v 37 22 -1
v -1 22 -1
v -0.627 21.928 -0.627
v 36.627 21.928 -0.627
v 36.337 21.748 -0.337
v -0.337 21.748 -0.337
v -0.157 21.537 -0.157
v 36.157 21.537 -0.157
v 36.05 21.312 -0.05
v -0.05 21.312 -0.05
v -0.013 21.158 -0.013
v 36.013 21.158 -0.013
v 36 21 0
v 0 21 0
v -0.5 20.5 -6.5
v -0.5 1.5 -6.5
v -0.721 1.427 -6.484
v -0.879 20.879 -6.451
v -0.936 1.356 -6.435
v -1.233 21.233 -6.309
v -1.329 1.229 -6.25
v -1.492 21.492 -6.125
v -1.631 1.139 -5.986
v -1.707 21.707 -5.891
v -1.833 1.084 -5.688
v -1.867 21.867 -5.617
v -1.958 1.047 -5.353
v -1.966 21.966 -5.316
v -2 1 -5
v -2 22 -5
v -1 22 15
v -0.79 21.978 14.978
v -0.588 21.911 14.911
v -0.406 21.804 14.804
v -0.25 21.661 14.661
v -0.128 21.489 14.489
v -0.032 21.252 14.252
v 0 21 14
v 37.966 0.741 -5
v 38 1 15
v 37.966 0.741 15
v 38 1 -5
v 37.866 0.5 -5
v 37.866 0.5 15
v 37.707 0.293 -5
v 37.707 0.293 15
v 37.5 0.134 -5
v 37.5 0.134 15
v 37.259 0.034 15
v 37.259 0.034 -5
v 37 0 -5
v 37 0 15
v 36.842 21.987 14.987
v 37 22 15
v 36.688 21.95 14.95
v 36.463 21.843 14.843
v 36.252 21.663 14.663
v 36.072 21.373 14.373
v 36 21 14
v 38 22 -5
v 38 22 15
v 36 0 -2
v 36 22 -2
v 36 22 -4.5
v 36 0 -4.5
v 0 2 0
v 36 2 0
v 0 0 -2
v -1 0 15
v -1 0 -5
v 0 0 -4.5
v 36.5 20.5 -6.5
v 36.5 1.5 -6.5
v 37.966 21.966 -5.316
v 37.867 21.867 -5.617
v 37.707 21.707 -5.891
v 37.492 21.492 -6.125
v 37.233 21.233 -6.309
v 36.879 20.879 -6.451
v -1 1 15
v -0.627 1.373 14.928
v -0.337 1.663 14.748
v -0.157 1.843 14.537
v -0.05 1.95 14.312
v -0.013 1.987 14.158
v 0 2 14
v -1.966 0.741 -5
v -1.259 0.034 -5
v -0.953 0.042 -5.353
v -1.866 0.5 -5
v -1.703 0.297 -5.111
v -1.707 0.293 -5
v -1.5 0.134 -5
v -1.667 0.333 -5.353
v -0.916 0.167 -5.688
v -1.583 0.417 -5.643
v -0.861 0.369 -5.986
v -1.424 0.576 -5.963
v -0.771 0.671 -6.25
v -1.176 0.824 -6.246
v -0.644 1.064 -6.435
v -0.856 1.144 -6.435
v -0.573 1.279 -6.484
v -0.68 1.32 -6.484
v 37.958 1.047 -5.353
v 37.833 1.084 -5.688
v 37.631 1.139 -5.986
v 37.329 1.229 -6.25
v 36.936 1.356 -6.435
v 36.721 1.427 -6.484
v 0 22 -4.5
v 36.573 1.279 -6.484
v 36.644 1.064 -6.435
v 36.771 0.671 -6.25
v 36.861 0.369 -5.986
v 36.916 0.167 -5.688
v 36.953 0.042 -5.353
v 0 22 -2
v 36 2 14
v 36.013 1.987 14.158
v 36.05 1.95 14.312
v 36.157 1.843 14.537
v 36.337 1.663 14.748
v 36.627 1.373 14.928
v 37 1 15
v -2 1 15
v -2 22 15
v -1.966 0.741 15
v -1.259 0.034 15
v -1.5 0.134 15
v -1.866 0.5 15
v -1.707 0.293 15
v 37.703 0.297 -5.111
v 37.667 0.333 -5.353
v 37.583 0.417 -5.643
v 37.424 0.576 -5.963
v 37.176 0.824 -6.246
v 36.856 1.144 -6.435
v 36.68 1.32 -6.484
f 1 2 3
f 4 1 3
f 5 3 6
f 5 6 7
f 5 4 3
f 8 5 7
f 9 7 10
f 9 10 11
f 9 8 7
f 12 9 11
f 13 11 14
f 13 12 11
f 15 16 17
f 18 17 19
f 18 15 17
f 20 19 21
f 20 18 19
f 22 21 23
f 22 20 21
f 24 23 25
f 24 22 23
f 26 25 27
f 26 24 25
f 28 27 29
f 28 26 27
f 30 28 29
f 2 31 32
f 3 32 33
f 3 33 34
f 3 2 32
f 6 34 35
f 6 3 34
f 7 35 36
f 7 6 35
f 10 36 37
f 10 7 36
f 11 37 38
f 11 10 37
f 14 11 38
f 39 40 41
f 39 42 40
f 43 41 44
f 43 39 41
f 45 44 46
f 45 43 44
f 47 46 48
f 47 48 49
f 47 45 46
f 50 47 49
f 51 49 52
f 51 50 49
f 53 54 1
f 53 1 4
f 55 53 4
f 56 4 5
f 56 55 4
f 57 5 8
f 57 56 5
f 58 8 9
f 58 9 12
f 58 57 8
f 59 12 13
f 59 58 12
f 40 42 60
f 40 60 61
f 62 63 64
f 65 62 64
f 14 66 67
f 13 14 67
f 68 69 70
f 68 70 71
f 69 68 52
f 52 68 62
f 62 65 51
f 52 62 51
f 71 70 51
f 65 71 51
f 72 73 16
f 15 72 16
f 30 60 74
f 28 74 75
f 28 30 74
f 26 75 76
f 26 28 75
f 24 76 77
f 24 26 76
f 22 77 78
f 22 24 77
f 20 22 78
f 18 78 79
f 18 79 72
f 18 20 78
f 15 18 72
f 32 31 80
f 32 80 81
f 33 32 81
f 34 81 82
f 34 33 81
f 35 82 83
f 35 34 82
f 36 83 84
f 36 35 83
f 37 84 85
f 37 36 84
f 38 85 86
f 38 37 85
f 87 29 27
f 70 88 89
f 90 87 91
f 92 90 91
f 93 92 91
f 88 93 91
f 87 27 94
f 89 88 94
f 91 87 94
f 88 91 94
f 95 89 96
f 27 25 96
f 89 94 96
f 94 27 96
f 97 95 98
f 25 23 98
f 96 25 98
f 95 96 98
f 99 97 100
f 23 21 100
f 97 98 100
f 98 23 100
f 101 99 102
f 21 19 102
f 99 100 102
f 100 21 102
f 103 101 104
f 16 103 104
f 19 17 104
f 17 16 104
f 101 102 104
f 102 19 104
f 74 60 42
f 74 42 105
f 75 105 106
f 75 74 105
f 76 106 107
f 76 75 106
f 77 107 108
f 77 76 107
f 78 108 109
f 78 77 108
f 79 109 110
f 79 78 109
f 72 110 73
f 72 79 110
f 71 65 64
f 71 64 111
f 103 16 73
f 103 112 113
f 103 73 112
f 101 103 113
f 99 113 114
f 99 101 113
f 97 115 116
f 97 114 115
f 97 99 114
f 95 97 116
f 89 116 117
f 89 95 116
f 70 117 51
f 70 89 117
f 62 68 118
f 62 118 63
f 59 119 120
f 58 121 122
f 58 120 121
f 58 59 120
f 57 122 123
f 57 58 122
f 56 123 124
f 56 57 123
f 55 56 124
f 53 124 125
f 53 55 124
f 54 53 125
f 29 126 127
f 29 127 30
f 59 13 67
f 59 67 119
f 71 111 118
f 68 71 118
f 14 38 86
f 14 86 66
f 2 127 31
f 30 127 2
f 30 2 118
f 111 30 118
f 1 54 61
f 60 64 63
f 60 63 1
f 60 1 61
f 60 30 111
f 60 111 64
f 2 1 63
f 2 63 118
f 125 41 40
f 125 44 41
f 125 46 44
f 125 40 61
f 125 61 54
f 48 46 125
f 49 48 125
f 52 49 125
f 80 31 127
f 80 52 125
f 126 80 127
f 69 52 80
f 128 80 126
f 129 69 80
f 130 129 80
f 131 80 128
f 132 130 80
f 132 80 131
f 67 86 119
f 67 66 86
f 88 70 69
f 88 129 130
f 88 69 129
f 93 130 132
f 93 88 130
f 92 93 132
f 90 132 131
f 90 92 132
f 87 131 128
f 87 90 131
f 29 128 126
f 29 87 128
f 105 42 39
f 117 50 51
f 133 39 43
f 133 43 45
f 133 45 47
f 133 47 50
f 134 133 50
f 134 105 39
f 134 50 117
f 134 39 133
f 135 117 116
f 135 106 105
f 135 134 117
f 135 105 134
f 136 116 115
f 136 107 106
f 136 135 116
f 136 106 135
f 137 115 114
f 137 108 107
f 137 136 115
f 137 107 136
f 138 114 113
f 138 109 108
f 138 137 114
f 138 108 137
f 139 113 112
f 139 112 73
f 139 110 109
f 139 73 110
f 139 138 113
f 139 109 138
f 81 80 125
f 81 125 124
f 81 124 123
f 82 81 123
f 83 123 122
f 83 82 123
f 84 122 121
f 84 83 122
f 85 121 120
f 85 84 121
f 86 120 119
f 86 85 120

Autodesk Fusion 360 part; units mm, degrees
sketch "Skizze1" plane through (0, 0, 0) normal (0, 1, 0) x (1, 0, 0)
  line L0 (0, 0) -> (36, 0)
  line L1 (36, 0) -> (36, -15)
  line L2 (36, -15) -> (0, -15)
  line L3 (0, -15) -> (0, 0)
  line L4 (38, 2) -> (38, -17)
  line L5 (38, -17) -> (-2, -17)
  line L6 (-2, -17) -> (-2, 2)
  line L7 (-2, 2) -> (38, 2)
  line L8 (0, 2) -> (36, 2)
  line L9 (36, 2) -> (36, 4.5)
  line L10 (36, 4.5) -> (0, 4.5)
  line L11 (0, 4.5) -> (0, 2)
  line L12 (38, 2) -> (38, 6.5)
  line L13 (38, 6.5) -> (-2, 6.5)
  line L14 (-2, 6.5) -> (-2, 2)
  line L15 (0, -15) -> (-2, -15)
  line L16 (36, -15) -> (38, -15)
  dimension "d6" = 36
  dimension "d7" = 15
  dimension "d8" = 2
  dimension "d9" = 36
  dimension "d10" = 2.5
  dimension "d11" = 2
extrude "Extrusion1" add sketch "Skizze1" along normal blind 2 contours L0 L1 L2 L3
extrude "Extrusion2" add sketch "Skizze1" along normal blind 22 contours L0 L1 L3 L4 L6 L7 L8 L15 L16 | L7 L9 L10 L11 L12 L13 L14
fillet "Abrundung1" radius 1 6 edges at (0, 12, 15) (0, 22, 7.5) (18, 22, 0) (36, 22, 7.5) (36, 12, 15) (18, 2, 15)
fillet "Abrundung2" radius 1.5 4 edges at (18, 22, -6.5) (-2, 11, -6.5) (38, 11, -6.5) (18, 0, -6.5)
fillet "Abrundung3" radius 1 4 edges at (37.5607, 0.4393, -6.0607) (38, 0, 5) (-1.5607, 0.4393, -6.0607) (-2, 0, 5)
equation "width = 3.6 cm"
equation "height = 1.5 cm"
equation "depth = 2 cm"
equation "wall = 2 mm"
equation "space = 2.5 mm"
equation "d6 = width"
equation "d7 = height"
equation "d8 = wall"
equation "d9 = width"
equation "d10 = space"
equation "d11 = wall"
equation "d13 = wall"
equation "d15 = wall + depth"
